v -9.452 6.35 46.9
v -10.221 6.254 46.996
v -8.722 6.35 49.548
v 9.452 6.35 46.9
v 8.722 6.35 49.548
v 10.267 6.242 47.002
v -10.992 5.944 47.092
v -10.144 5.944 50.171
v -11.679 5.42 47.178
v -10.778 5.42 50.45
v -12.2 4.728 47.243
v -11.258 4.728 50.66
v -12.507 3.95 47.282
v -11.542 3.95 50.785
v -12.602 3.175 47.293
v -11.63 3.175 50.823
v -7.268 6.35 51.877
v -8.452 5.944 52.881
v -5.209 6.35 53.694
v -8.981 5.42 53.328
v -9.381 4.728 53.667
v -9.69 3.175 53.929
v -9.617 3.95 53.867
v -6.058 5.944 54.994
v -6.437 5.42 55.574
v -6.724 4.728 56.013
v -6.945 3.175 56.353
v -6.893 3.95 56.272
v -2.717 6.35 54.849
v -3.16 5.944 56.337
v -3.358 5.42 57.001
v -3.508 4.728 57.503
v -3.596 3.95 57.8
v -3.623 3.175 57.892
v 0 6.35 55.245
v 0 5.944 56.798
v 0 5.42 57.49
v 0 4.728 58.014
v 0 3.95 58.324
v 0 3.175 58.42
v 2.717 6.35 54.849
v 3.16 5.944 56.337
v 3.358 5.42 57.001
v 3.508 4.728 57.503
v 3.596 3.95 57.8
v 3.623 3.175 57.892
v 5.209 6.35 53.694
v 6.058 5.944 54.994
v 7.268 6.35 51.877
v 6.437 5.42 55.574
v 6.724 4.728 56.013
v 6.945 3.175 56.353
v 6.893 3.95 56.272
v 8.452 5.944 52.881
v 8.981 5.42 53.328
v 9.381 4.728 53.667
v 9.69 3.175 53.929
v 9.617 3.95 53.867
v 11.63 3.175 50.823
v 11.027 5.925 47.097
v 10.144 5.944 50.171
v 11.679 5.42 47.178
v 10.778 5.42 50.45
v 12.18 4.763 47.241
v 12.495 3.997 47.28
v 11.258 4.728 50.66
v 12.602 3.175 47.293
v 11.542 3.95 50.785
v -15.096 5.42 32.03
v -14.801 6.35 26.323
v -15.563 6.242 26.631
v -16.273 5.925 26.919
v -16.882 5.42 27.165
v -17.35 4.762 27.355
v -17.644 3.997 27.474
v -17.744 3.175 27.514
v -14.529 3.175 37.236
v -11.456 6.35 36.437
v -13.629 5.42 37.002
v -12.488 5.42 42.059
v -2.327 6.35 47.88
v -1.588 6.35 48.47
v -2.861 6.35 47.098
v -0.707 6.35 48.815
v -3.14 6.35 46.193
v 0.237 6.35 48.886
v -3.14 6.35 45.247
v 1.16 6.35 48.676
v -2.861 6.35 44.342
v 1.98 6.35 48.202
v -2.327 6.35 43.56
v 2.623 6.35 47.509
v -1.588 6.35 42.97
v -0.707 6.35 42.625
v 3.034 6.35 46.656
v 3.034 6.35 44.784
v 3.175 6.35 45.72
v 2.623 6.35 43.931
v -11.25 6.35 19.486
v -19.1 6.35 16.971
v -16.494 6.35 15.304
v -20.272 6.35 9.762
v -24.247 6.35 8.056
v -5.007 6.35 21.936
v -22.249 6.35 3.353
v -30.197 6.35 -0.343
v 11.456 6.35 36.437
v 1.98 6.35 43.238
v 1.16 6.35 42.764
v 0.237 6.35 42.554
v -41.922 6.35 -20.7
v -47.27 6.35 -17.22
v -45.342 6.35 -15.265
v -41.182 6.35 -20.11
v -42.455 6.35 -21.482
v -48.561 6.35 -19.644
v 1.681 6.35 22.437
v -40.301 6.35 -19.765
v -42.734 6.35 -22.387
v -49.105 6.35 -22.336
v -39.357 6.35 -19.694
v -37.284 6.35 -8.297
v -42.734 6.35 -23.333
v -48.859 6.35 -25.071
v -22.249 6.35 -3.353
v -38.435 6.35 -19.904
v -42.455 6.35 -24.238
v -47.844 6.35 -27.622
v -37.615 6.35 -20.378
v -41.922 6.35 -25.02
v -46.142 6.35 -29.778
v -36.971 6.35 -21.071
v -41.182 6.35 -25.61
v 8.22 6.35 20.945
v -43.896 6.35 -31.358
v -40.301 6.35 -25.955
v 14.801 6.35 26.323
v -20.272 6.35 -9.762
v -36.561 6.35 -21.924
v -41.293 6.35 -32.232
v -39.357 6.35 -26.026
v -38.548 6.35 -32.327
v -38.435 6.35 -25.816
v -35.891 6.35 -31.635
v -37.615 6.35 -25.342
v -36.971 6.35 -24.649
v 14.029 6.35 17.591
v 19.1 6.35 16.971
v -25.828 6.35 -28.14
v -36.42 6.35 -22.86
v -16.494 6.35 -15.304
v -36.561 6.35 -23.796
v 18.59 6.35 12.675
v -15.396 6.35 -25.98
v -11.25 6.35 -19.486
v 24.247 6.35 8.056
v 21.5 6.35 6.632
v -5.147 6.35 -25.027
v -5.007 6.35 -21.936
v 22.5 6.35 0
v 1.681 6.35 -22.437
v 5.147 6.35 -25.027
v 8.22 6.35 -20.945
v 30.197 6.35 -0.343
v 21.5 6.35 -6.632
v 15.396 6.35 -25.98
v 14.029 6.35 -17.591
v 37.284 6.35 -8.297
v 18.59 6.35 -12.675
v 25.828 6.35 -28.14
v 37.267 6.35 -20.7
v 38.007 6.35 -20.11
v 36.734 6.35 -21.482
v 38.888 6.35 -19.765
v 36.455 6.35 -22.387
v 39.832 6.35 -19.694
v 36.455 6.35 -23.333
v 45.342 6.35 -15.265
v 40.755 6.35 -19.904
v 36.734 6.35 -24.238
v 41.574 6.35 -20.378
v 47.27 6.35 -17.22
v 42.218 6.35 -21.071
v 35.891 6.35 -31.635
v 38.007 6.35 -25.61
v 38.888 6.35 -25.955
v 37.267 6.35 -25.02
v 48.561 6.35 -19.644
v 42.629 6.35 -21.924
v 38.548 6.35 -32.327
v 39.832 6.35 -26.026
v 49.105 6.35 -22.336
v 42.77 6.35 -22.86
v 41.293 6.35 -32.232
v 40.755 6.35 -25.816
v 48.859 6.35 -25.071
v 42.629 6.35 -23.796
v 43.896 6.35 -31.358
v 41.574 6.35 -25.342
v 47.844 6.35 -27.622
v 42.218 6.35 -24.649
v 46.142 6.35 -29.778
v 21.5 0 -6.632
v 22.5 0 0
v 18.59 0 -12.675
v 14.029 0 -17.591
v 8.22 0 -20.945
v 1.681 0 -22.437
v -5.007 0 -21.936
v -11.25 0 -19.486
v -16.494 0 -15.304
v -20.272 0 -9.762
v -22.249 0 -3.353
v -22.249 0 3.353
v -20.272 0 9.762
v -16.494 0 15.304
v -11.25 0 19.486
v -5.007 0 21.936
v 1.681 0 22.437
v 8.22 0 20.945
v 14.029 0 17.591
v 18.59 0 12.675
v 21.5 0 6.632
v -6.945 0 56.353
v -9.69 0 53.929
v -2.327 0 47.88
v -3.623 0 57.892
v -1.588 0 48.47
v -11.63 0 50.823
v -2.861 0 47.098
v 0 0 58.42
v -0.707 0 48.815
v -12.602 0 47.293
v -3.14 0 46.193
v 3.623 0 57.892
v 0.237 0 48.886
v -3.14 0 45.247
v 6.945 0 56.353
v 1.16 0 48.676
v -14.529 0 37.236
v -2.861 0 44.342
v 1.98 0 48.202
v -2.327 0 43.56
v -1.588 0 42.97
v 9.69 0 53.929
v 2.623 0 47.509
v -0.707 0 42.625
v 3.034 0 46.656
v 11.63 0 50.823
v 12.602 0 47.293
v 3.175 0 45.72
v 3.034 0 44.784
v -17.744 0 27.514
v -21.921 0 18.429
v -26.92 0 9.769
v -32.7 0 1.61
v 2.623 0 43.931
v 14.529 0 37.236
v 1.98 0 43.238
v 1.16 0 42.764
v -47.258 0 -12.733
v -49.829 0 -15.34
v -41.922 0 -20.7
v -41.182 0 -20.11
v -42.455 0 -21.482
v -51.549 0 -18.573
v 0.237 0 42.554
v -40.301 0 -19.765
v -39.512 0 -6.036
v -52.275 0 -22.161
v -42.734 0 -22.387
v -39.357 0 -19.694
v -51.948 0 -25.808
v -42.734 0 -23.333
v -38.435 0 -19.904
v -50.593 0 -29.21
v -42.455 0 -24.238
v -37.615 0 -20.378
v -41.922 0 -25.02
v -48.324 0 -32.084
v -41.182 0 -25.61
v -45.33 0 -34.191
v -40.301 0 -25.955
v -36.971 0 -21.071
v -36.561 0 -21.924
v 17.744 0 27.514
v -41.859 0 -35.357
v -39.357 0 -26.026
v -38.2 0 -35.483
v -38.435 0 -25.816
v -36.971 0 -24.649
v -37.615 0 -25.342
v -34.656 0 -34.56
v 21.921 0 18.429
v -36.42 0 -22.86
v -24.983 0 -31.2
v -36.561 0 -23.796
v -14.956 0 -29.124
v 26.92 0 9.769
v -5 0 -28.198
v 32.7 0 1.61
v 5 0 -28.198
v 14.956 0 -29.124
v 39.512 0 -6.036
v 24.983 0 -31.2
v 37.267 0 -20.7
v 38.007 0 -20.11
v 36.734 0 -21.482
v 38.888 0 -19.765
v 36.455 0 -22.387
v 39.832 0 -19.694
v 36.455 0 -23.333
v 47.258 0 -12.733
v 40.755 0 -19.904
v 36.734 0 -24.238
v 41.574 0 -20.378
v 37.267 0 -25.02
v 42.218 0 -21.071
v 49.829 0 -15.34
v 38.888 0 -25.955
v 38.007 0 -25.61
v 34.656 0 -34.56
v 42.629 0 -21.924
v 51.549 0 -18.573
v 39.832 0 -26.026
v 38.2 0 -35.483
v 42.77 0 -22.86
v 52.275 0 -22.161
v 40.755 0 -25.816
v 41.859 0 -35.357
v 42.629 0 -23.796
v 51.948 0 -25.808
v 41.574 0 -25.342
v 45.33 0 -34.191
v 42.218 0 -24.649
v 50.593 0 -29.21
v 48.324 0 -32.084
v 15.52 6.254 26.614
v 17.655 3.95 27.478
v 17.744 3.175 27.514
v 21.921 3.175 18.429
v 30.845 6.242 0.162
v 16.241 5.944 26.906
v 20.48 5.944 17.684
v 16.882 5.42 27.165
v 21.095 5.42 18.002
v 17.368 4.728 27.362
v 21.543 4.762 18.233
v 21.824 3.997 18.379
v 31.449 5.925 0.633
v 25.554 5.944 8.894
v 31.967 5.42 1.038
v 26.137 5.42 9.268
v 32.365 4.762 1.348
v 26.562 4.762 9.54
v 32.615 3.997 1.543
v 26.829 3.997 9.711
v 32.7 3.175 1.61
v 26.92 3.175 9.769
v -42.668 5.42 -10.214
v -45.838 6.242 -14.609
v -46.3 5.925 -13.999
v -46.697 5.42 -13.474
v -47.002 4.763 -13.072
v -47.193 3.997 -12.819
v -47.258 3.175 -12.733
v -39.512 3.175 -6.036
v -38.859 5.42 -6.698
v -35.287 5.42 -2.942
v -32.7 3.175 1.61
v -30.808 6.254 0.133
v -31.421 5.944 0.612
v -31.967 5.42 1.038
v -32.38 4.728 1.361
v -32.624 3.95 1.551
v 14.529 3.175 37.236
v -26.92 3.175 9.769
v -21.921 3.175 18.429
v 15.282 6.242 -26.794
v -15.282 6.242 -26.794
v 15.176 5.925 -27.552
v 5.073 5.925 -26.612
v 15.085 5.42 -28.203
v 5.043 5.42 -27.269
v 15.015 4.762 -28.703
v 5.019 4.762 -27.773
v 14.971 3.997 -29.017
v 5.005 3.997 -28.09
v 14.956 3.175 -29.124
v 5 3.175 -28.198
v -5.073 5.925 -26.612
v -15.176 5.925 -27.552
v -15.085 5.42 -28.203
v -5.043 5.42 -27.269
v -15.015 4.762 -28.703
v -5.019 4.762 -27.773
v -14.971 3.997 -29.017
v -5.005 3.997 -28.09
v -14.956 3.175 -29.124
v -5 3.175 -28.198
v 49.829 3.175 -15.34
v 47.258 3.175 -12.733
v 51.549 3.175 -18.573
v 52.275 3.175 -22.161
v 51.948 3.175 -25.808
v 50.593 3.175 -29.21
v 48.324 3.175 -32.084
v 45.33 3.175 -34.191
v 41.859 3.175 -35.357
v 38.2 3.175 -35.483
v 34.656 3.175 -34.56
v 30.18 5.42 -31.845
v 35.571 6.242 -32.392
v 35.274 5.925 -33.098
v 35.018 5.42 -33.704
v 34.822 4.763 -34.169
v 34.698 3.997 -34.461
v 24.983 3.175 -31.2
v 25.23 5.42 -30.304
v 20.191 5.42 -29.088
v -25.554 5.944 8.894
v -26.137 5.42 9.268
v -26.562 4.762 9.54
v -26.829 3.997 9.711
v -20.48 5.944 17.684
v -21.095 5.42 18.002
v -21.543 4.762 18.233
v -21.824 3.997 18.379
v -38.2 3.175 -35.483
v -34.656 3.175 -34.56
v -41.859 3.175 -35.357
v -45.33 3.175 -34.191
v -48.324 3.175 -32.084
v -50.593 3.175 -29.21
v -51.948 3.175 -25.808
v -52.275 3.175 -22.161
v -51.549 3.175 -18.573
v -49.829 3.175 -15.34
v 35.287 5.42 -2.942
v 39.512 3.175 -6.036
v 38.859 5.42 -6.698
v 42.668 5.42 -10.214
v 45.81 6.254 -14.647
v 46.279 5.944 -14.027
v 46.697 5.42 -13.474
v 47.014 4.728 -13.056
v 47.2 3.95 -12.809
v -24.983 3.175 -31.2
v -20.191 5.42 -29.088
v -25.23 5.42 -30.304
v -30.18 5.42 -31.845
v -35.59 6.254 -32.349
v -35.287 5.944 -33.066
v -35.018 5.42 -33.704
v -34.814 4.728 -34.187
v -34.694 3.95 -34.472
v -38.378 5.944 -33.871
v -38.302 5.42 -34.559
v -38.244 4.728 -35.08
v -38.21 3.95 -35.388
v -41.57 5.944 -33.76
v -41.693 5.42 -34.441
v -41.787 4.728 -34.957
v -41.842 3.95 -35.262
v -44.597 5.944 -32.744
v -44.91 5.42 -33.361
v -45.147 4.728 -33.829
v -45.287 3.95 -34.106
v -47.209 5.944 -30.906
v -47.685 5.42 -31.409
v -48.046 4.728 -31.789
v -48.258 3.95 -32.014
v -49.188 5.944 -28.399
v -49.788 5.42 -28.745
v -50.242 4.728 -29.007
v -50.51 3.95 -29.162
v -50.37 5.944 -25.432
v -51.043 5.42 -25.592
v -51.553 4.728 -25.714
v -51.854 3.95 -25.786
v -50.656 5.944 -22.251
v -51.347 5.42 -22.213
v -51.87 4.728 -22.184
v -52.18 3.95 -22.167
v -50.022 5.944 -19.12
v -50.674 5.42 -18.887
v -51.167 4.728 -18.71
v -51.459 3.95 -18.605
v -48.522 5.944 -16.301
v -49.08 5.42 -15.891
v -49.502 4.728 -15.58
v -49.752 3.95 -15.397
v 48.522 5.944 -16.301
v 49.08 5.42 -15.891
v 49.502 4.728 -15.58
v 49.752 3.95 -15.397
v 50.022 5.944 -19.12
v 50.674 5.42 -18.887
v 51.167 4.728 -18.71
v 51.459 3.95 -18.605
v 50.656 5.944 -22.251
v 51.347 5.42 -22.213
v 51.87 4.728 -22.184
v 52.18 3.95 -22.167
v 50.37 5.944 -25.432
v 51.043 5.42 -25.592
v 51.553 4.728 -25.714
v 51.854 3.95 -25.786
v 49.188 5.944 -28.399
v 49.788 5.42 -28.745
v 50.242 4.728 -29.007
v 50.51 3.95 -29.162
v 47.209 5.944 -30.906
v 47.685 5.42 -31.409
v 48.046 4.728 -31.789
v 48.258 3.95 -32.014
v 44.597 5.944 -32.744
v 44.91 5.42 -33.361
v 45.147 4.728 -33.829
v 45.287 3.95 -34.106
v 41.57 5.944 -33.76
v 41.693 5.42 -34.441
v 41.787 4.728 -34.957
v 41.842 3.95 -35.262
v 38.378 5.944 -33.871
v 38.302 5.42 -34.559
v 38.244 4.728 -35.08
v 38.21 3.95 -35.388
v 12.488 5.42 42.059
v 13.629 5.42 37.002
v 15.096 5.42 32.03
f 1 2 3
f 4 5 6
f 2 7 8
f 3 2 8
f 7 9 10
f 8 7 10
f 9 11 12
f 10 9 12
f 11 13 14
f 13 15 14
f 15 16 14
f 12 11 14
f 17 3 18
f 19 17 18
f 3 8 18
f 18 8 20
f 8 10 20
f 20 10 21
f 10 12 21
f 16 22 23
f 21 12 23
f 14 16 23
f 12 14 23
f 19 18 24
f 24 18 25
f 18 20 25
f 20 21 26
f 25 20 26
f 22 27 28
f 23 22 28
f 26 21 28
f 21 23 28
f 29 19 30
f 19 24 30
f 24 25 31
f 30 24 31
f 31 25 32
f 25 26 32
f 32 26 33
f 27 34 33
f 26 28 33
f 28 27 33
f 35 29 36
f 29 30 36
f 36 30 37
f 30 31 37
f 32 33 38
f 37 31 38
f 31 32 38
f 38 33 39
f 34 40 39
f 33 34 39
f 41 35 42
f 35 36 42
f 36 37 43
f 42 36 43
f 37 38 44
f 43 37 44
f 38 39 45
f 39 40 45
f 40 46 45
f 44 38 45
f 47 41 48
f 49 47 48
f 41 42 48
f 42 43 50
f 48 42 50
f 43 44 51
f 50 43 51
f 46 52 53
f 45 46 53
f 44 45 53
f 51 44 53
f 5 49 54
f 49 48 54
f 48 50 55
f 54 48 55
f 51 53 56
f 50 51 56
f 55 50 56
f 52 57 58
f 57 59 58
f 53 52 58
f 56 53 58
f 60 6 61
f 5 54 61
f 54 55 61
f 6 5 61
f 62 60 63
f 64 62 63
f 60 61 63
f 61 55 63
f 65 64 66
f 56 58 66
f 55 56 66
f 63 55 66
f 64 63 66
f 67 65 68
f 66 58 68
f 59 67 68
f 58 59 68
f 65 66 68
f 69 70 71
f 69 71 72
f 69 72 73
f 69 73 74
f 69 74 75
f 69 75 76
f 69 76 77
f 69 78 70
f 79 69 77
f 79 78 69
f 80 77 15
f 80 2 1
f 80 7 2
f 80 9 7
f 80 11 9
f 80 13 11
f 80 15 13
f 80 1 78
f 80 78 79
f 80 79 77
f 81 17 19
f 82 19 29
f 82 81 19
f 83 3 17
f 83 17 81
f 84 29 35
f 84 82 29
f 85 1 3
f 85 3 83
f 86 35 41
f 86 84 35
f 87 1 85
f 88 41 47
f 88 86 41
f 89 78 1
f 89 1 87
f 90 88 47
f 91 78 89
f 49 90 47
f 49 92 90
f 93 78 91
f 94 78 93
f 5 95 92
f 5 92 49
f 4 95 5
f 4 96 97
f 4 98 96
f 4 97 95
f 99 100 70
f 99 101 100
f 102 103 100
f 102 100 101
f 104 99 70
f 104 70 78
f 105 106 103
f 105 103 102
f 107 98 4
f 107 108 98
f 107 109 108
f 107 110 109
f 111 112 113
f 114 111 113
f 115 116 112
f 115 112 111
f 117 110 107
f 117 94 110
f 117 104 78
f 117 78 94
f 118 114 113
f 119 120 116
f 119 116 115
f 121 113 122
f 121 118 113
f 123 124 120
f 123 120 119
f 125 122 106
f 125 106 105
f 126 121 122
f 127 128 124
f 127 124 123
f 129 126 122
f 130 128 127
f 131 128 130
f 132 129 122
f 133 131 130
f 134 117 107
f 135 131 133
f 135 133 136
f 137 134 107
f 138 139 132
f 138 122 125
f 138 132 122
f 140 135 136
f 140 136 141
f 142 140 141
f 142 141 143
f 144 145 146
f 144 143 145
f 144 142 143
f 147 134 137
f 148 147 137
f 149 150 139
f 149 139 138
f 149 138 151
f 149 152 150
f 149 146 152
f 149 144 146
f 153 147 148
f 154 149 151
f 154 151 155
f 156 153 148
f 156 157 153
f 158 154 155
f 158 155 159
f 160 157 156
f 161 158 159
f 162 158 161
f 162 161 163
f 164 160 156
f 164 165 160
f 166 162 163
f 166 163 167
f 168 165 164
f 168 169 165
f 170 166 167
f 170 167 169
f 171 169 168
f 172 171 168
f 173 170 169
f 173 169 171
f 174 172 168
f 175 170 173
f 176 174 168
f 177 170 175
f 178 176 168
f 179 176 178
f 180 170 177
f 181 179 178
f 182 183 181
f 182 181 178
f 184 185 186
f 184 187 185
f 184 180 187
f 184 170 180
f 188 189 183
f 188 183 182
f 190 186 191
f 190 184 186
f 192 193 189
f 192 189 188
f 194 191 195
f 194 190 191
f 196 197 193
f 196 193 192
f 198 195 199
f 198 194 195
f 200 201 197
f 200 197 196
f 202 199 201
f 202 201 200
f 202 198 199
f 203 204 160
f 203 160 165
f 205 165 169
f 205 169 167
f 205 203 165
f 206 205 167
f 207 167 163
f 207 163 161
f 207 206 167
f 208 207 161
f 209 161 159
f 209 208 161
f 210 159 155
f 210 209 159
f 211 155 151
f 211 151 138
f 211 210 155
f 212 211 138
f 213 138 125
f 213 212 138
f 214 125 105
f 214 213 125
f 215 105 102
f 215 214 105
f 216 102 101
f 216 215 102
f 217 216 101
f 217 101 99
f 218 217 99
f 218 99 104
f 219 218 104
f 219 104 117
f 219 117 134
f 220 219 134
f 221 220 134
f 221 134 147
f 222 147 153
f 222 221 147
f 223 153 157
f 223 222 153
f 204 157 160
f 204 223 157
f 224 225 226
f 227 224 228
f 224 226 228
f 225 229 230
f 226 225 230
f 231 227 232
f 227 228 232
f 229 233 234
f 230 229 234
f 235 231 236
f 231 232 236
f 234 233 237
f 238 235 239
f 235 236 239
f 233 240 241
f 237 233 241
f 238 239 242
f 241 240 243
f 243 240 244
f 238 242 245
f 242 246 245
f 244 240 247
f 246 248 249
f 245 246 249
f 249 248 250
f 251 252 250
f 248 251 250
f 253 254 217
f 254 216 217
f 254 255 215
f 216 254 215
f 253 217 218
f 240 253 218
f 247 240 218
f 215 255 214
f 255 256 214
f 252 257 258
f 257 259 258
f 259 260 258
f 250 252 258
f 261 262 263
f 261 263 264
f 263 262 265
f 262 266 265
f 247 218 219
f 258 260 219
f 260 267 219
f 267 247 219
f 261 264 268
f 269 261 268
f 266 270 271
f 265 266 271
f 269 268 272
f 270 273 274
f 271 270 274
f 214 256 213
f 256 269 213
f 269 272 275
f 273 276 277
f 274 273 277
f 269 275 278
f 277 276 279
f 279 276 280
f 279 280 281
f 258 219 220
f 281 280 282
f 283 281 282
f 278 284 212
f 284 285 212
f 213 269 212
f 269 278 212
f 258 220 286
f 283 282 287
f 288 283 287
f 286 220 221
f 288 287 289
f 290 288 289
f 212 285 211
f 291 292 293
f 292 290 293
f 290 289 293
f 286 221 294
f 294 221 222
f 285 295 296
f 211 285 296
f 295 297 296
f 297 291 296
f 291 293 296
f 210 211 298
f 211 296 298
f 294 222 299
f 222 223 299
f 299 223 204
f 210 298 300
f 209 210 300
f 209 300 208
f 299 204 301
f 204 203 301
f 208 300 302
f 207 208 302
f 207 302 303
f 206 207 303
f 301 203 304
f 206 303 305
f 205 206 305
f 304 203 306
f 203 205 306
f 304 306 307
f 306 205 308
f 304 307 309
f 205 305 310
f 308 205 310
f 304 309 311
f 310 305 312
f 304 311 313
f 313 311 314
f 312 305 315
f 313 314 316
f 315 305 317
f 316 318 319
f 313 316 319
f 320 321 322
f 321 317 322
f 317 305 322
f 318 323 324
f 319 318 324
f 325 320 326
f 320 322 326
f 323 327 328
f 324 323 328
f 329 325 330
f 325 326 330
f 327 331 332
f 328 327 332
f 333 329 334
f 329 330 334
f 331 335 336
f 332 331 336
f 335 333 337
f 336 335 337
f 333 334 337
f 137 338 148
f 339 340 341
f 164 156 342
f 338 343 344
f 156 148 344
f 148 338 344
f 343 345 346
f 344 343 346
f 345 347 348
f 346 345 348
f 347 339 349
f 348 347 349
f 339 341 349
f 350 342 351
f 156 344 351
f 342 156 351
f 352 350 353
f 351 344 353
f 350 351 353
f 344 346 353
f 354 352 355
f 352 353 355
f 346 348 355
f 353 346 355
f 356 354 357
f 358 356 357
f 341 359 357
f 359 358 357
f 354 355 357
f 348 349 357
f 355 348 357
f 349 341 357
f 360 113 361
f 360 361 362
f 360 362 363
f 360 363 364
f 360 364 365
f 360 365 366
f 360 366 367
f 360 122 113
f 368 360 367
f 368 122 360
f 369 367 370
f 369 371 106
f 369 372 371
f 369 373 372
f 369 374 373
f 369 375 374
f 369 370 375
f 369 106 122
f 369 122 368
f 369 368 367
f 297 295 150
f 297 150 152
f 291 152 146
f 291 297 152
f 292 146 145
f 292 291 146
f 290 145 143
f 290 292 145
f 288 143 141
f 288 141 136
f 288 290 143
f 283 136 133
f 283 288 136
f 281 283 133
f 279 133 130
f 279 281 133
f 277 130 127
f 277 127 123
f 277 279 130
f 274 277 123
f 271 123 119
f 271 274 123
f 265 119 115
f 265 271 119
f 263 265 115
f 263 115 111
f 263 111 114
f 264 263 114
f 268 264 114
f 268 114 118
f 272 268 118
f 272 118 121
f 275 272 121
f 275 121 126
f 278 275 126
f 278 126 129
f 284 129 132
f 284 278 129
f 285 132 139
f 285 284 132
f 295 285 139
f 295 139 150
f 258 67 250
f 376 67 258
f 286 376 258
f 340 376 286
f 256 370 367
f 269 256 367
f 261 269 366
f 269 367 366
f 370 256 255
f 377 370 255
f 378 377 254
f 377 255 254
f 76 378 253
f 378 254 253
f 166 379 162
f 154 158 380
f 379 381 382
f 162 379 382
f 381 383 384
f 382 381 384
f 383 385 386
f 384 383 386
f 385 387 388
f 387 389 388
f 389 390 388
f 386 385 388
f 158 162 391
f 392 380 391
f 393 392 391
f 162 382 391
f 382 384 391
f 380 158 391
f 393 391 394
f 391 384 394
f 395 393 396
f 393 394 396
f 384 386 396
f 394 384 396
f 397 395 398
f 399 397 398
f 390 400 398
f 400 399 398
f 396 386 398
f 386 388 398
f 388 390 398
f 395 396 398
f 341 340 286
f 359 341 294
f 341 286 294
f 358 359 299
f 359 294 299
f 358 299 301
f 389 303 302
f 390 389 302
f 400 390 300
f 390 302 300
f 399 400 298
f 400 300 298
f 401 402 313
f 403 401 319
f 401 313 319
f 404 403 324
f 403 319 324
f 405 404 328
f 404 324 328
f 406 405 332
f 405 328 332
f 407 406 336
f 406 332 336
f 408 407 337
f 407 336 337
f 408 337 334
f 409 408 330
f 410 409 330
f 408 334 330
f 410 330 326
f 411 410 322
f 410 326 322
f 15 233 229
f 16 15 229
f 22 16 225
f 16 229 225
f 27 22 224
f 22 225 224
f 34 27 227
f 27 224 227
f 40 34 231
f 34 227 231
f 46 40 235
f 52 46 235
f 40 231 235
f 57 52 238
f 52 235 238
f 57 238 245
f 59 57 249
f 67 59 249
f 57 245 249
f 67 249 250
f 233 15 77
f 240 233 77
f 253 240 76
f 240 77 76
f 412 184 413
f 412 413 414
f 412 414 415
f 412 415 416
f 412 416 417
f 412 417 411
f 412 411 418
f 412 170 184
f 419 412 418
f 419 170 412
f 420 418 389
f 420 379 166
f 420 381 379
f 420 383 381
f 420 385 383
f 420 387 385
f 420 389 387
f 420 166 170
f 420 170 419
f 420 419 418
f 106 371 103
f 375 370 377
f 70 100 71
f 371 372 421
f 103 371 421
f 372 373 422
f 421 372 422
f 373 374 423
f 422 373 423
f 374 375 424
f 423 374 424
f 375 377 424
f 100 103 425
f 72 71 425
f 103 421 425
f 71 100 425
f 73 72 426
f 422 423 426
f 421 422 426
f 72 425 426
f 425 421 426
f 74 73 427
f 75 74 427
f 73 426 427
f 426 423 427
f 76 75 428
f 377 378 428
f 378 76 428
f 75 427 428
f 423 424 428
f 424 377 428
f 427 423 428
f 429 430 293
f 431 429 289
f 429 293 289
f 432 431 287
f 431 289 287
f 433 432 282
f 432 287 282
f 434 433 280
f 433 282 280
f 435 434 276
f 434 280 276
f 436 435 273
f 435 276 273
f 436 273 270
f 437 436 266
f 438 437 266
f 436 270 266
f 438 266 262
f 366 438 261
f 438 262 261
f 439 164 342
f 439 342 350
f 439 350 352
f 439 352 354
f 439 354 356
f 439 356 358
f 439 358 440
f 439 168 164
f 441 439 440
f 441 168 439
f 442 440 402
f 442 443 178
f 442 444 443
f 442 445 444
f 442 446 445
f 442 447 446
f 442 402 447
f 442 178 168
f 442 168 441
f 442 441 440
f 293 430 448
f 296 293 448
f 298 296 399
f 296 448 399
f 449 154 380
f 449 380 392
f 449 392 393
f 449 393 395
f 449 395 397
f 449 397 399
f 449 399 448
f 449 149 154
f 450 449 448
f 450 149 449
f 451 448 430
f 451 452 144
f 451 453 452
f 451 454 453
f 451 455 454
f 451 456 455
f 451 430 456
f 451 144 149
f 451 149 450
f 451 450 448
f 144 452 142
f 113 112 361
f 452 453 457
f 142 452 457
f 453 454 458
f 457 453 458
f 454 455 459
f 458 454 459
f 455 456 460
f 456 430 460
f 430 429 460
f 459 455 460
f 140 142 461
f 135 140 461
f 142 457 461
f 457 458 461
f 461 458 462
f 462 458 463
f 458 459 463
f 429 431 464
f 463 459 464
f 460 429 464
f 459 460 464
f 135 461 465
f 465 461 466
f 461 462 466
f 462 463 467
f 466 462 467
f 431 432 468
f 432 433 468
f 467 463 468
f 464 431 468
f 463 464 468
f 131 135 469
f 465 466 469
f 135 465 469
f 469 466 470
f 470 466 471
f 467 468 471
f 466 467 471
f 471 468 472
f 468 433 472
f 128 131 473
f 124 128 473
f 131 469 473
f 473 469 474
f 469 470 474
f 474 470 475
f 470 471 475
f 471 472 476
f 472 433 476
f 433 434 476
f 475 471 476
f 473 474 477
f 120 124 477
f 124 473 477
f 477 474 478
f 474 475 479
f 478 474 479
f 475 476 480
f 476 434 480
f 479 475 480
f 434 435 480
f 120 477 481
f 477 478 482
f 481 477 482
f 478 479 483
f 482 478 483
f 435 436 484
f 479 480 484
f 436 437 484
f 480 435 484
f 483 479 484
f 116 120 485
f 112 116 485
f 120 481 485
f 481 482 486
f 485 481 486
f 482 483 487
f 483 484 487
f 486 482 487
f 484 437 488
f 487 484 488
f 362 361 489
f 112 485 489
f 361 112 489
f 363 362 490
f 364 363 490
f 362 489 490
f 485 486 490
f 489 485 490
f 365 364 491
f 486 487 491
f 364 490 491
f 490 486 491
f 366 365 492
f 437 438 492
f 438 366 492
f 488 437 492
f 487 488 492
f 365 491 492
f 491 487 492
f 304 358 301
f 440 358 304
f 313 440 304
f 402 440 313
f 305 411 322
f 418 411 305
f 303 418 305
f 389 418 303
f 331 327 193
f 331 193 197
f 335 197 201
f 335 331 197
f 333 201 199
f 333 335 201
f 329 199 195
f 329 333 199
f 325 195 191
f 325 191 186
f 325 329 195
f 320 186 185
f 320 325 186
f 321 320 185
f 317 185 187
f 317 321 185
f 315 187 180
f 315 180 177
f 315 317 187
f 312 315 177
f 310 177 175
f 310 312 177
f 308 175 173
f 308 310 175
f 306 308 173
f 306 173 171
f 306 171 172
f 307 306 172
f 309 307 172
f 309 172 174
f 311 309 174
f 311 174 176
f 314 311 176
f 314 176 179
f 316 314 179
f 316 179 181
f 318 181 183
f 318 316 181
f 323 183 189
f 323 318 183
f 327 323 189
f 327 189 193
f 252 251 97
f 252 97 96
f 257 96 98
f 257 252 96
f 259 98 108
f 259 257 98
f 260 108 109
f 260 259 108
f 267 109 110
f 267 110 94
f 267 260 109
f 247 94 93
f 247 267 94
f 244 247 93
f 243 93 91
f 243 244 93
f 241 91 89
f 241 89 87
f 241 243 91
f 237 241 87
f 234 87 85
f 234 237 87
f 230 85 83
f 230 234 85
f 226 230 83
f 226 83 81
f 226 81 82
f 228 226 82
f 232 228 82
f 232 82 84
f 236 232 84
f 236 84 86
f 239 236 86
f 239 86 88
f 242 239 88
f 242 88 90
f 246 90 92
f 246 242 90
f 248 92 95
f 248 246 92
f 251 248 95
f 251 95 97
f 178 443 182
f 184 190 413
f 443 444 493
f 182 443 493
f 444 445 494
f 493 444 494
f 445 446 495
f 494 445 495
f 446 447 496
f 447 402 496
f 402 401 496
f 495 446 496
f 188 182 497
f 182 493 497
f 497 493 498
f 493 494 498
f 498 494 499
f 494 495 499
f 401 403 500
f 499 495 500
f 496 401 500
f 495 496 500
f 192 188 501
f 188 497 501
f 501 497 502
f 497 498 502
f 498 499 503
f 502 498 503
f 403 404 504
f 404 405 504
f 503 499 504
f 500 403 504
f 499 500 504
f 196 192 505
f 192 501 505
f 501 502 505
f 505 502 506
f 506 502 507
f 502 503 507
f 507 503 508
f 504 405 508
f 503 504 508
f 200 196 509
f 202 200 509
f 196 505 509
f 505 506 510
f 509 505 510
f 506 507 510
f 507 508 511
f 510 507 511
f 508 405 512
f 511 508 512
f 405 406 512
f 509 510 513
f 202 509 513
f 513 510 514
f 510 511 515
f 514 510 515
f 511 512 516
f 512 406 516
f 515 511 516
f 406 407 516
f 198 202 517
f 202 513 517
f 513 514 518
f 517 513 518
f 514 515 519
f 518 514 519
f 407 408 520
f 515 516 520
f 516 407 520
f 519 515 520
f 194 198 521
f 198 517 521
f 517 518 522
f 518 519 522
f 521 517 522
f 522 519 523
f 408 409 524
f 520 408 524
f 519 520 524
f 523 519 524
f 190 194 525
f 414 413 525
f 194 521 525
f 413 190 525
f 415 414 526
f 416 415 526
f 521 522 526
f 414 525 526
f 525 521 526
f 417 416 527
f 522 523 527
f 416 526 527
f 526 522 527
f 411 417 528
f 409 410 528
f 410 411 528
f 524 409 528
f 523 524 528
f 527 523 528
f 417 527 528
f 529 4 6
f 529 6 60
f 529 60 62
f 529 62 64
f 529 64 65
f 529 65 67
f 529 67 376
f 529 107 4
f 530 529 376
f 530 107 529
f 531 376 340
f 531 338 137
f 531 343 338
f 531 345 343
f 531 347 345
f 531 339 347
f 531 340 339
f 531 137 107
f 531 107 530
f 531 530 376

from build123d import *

# Parameters (mm, degrees)
SKETCH1_R           = 22.5
SKETCH1_R_2         = 3.175
BOSS_EXTRUDE4_DEPTH = 6.35
FILLET1_R           = 78.74
FILLET3_R           = 3.175


with BuildPart() as part:
    # Sketch1 → Boss-Extrude4 (new body)
    with BuildSketch(Plane(origin=(0, 0, 0), x_dir=(1, 0, 0), z_dir=(0, 1, 0))):
        with BuildLine():
            ThreePointArc((-12.576911226, -43.956111111), (0, -58.42), (12.576911226, -43.956111111))
            ThreePointArc((12.576911226, -43.956111111), (24.319961907, -14.041136553), (44.355564487, 11.086130933))
            ThreePointArc((44.355564487, 11.086130933), (50.593204089, 29.21), (31.778653261, 32.869980178))
            ThreePointArc((31.778653261, 32.869980178), (0, 28.082273107), (-31.778653261, 32.869980178))
            ThreePointArc((-31.778653261, 32.869980178), (-50.593204089, 29.21), (-44.355564487, 11.086130933))
            ThreePointArc((-44.355564487, 11.086130933), (-24.319961907, -14.041136553), (-12.576911226, -43.956111111))
        make_face()
        Circle(SKETCH1_R, mode=Mode.SUBTRACT)
        with Locations((0, -45.72)):
            Circle(SKETCH1_R_2, mode=Mode.SUBTRACT)
        with Locations((-39.594681461, 22.86)):
            Circle(SKETCH1_R_2, mode=Mode.SUBTRACT)
        with Locations((39.594681461, 22.86)):
            Circle(SKETCH1_R_2, mode=Mode.SUBTRACT)
    extrude(amount=BOSS_EXTRUDE4_DEPTH)

    # Fillet1
    fillet1_edges = [part.edges().sort_by_distance(p)[0] for p in [
        (-12.576911226, 3.175, 43.956111111),
        (-44.355564487, 3.175, -11.086130933),
        (-31.778653261, 3.175, -32.869980178),
        (31.778653261, 3.175, -32.869980178),
        (44.355564487, 3.175, -11.086130933),
        (12.576911226, 3.175, 43.956111111),
    ]]
    fillet(fillet1_edges, radius=FILLET1_R)

    # Fillet3
    fillet3_edges = [part.edges().sort_by_distance(p)[0] for p in [
        (0, 6.35, -28.082273107),
        (50.593204089, 6.35, -29.21),
        (-50.593204089, 6.35, -29.21),
        (-24.319961907, 6.35, 14.041136554),
        (0, 6.35, 58.42),
        (24.319961907, 6.35, 14.041136553),
        (24.983104272, 6.35, -31.200471163),
        (-24.983104272, 6.35, -31.200471163),
        (-39.511952773, 6.35, -6.035767384),
        (-14.528848501, 6.35, 37.236238547),
        (14.528848501, 6.35, 37.236238547),
        (39.511952773, 6.35, -6.035767384),
    ]]
    fillet(fillet3_edges, radius=FILLET3_R)


solid = part.part
